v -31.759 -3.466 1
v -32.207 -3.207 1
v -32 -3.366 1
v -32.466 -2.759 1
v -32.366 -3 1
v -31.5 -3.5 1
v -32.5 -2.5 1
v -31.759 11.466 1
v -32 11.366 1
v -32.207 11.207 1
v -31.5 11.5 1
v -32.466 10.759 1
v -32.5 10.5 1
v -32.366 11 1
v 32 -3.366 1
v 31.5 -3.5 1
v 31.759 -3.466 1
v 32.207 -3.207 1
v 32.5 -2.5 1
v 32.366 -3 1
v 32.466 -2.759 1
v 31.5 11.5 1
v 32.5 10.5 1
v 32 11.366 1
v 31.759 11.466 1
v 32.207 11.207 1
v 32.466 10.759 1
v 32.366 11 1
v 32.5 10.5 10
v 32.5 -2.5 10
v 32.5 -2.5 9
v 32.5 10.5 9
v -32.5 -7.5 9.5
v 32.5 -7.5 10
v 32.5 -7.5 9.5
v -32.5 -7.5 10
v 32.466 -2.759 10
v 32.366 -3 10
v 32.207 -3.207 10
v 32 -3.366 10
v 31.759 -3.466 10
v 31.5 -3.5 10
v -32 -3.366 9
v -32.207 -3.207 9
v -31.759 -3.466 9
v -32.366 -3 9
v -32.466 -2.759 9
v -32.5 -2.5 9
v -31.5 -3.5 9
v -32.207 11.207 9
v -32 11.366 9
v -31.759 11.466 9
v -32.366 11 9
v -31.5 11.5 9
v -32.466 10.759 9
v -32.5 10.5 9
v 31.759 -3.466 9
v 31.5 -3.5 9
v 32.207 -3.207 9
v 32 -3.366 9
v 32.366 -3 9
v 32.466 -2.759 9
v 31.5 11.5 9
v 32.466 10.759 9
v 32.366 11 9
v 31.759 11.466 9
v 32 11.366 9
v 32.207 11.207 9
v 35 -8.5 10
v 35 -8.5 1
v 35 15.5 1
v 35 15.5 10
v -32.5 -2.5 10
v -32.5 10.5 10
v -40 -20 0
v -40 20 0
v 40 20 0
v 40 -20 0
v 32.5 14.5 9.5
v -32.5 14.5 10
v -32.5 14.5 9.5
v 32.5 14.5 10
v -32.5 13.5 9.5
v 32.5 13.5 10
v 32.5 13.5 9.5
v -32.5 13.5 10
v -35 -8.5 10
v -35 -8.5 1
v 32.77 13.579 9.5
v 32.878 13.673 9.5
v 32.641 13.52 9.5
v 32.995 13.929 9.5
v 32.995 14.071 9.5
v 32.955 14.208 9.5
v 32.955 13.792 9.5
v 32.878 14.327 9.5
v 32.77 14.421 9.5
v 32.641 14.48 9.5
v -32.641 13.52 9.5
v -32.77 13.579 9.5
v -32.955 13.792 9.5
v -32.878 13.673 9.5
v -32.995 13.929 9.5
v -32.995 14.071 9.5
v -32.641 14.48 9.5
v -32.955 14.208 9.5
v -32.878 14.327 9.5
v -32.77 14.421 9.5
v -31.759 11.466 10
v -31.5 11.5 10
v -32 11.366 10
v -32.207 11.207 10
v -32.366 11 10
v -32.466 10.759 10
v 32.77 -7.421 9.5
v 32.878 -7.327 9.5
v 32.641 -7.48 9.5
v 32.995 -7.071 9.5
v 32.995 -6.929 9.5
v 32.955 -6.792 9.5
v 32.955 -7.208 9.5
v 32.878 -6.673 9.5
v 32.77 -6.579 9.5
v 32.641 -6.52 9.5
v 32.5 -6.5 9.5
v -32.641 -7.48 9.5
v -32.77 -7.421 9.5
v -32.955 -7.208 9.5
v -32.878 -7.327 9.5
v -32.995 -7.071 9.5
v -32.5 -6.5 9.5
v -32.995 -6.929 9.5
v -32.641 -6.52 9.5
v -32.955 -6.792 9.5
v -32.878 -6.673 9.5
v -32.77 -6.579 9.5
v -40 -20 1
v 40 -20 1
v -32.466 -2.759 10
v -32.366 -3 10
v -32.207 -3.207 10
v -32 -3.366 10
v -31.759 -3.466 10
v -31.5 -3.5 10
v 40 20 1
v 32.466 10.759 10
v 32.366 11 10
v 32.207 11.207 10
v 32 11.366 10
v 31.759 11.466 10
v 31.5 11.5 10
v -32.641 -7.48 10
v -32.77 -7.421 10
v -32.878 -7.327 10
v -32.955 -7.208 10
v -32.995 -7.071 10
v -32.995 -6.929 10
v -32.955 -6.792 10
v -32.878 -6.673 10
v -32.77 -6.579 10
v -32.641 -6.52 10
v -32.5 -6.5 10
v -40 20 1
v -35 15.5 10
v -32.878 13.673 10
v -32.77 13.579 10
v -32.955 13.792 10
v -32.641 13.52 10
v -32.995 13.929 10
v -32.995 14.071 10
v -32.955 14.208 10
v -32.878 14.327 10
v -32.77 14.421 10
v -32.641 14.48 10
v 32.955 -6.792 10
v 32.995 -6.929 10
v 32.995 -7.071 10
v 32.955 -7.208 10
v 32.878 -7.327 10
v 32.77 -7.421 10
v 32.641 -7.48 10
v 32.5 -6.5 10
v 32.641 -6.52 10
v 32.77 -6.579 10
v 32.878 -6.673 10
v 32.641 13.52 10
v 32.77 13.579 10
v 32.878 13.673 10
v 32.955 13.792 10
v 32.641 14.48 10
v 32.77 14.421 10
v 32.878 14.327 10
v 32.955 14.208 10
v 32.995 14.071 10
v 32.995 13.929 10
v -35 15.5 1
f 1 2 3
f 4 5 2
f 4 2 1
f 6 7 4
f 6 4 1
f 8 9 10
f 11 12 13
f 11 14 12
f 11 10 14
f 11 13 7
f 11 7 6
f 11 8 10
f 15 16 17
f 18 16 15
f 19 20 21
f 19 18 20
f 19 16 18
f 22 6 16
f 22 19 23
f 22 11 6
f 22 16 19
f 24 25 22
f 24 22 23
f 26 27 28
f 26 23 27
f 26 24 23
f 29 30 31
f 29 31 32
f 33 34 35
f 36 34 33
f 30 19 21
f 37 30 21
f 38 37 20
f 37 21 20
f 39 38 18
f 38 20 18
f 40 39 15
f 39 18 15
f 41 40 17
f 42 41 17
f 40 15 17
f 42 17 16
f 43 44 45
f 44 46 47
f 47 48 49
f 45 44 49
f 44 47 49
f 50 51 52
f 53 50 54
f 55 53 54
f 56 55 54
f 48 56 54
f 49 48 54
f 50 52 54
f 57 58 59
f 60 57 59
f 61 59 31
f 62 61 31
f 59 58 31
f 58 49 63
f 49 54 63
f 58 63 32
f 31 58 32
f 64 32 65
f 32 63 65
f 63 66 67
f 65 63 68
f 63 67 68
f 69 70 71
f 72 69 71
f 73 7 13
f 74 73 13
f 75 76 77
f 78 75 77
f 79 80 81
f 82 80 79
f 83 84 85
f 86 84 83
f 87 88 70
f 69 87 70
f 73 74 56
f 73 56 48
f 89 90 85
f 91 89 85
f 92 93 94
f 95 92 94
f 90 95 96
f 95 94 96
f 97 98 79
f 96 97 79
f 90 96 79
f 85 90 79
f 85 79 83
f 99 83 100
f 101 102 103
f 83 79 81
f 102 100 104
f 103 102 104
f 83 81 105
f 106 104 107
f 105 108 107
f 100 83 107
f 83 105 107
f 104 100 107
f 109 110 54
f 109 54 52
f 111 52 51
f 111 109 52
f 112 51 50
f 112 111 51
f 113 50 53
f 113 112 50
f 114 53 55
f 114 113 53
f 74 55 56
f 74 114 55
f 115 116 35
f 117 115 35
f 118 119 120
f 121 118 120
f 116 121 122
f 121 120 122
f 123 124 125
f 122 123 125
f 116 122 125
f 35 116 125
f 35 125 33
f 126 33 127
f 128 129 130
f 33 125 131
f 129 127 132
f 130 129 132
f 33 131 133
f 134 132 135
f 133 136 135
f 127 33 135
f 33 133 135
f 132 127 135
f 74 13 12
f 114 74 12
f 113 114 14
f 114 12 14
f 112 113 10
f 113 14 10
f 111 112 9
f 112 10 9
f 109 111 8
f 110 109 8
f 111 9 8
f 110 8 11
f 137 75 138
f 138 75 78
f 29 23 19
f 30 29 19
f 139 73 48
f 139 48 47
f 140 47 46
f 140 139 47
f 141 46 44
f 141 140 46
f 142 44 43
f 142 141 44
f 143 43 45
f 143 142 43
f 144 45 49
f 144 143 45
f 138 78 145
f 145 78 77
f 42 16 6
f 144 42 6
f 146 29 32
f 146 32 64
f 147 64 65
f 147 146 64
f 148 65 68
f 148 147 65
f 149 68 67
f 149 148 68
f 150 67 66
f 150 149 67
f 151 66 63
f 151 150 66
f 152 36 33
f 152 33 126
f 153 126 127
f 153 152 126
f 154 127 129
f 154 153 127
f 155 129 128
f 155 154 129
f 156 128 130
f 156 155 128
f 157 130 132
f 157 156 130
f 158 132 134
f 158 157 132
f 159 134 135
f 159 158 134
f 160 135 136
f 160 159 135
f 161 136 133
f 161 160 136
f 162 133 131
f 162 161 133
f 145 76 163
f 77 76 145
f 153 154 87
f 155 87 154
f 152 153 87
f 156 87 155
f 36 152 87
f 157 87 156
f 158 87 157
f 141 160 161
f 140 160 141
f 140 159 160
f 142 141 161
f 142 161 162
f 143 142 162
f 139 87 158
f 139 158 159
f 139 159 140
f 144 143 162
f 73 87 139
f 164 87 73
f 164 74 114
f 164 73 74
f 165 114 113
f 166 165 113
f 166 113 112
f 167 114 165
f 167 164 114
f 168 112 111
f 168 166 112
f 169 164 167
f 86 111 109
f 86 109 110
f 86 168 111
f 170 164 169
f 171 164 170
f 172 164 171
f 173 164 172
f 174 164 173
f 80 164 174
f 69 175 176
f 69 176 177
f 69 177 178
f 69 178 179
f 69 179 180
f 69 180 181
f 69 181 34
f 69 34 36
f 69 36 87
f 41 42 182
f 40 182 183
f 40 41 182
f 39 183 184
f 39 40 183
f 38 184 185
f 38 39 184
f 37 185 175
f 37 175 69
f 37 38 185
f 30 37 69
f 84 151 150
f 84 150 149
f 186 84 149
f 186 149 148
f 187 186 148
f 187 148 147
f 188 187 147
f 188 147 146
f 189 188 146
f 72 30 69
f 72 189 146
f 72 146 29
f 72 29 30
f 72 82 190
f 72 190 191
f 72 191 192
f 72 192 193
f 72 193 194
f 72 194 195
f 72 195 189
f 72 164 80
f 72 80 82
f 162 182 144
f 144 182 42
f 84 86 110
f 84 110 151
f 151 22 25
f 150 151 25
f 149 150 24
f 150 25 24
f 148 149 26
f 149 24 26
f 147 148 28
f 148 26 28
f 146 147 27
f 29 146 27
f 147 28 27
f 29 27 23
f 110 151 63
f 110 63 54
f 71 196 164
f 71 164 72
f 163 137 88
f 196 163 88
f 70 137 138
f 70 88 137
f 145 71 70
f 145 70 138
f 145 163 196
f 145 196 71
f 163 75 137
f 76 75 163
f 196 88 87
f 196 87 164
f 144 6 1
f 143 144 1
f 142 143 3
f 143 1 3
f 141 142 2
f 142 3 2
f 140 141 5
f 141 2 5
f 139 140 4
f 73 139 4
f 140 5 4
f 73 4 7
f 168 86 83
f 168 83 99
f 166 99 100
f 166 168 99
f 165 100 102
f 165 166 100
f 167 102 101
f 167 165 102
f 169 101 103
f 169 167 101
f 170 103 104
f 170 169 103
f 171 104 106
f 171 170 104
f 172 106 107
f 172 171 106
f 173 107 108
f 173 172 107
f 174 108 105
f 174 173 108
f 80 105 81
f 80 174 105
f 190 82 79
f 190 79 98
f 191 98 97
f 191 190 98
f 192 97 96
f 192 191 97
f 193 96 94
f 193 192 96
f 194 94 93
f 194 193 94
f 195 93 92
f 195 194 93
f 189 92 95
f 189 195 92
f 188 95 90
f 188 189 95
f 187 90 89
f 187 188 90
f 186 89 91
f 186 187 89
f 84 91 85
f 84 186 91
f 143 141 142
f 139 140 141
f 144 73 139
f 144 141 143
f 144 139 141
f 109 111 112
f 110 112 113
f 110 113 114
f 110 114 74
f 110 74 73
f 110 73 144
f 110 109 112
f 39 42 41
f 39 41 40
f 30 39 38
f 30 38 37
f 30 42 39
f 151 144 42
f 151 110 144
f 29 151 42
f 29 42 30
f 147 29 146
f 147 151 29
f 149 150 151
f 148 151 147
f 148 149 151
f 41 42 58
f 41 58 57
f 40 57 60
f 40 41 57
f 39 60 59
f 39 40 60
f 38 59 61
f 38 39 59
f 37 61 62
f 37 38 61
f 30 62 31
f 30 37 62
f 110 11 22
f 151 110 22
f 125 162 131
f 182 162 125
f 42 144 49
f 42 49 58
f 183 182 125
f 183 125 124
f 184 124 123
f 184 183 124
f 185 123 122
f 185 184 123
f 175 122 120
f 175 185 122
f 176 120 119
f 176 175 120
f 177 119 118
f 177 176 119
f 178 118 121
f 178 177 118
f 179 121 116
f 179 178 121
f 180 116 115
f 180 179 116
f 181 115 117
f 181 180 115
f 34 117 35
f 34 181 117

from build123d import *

# Parameters (mm, degrees)
ESQUISSE1_W             = 80
ESQUISSE1_H             = 40
BOSS_EXTRU_1_DEPTH      = 1
ESQUISSE2_W             = 70
ESQUISSE2_H             = 24
BOSS_EXTRU_2_DEPTH      = 9
ENL_V_MAT_EXTRU_1_DEPTH = 0.5
BOSS_EXTRU_4_DEPTH      = 1


with BuildPart() as part:
    # Esquisse1 → Boss.-Extru.1 (new body)
    with BuildSketch(Plane.XY):
        Rectangle(ESQUISSE1_W, ESQUISSE1_H)
    extrude(amount=BOSS_EXTRU_1_DEPTH)

    # Esquisse2 → Boss.-Extru.2 (add)
    with BuildSketch(Plane.XY.offset(1)):
        with Locations((0, 3.5)):
            Rectangle(ESQUISSE2_W, ESQUISSE2_H)
        with BuildLine():
            Line((-31.5, 11.5), (31.5, 11.5))
            ThreePointArc((31.5, 11.5), (32.207106781, 11.207106781), (32.5, 10.5))
            Line((32.5, 10.5), (32.5, -2.5))
            ThreePointArc((32.5, -2.5), (32.207106781, -3.207106781), (31.5, -3.5))
            Line((31.5, -3.5), (-31.5, -3.5))
            ThreePointArc((-31.5, -3.5), (-32.207106781, -3.207106781), (-32.5, -2.5))
            Line((-32.5, -2.5), (-32.5, 10.5))
            ThreePointArc((-32.5, 10.5), (-32.207106781, 11.207106781), (-31.5, 11.5))
        make_face(mode=Mode.SUBTRACT)
    extrude(amount=BOSS_EXTRU_2_DEPTH)

    # Esquisse3 → Enlèv. mat.-Extru.1 (cut)
    with BuildSketch(Plane.XY.offset(10)):
        with BuildLine():
            Line((-32.5, 14.5), (32.5, 14.5))
            ThreePointArc((32.5, 14.5), (33, 14), (32.5, 13.5))
            Line((32.5, 13.5), (-32.5, 13.5))
            ThreePointArc((-32.5, 13.5), (-33, 14), (-32.5, 14.5))
        make_face()
        with BuildLine():
            Line((-32.5, -6.5), (32.5, -6.5))
            ThreePointArc((32.5, -6.5), (33, -7), (32.5, -7.5))
            Line((32.5, -7.5), (-32.5, -7.5))
            ThreePointArc((-32.5, -7.5), (-33, -7), (-32.5, -6.5))
        make_face()
    extrude(amount=-ENL_V_MAT_EXTRU_1_DEPTH, mode=Mode.SUBTRACT)


with BuildPart() as body_2:
    # Esquisse4 → Boss.-Extru.4 (new body)
    with BuildSketch(Plane.XY.offset(10)):
        with BuildLine():
            Line((32.5, -2.5), (32.5, 10.5))
            ThreePointArc((32.5, 10.5), (32.207106781, 11.207106781), (31.5, 11.5))
            Line((31.5, 11.5), (-31.5, 11.5))
            ThreePointArc((-31.5, 11.5), (-32.207106781, 11.207106781), (-32.5, 10.5))
            Line((-32.5, 10.5), (-32.5, -2.5))
            ThreePointArc((-32.5, -2.5), (-32.207106781, -3.207106781), (-31.5, -3.5))
            Line((-31.5, -3.5), (31.5, -3.5))
            ThreePointArc((31.5, -3.5), (32.207106781, -3.207106781), (32.5, -2.5))
        make_face()
    extrude(amount=-BOSS_EXTRU_4_DEPTH)


solid = Compound([part.part, body_2.part])
